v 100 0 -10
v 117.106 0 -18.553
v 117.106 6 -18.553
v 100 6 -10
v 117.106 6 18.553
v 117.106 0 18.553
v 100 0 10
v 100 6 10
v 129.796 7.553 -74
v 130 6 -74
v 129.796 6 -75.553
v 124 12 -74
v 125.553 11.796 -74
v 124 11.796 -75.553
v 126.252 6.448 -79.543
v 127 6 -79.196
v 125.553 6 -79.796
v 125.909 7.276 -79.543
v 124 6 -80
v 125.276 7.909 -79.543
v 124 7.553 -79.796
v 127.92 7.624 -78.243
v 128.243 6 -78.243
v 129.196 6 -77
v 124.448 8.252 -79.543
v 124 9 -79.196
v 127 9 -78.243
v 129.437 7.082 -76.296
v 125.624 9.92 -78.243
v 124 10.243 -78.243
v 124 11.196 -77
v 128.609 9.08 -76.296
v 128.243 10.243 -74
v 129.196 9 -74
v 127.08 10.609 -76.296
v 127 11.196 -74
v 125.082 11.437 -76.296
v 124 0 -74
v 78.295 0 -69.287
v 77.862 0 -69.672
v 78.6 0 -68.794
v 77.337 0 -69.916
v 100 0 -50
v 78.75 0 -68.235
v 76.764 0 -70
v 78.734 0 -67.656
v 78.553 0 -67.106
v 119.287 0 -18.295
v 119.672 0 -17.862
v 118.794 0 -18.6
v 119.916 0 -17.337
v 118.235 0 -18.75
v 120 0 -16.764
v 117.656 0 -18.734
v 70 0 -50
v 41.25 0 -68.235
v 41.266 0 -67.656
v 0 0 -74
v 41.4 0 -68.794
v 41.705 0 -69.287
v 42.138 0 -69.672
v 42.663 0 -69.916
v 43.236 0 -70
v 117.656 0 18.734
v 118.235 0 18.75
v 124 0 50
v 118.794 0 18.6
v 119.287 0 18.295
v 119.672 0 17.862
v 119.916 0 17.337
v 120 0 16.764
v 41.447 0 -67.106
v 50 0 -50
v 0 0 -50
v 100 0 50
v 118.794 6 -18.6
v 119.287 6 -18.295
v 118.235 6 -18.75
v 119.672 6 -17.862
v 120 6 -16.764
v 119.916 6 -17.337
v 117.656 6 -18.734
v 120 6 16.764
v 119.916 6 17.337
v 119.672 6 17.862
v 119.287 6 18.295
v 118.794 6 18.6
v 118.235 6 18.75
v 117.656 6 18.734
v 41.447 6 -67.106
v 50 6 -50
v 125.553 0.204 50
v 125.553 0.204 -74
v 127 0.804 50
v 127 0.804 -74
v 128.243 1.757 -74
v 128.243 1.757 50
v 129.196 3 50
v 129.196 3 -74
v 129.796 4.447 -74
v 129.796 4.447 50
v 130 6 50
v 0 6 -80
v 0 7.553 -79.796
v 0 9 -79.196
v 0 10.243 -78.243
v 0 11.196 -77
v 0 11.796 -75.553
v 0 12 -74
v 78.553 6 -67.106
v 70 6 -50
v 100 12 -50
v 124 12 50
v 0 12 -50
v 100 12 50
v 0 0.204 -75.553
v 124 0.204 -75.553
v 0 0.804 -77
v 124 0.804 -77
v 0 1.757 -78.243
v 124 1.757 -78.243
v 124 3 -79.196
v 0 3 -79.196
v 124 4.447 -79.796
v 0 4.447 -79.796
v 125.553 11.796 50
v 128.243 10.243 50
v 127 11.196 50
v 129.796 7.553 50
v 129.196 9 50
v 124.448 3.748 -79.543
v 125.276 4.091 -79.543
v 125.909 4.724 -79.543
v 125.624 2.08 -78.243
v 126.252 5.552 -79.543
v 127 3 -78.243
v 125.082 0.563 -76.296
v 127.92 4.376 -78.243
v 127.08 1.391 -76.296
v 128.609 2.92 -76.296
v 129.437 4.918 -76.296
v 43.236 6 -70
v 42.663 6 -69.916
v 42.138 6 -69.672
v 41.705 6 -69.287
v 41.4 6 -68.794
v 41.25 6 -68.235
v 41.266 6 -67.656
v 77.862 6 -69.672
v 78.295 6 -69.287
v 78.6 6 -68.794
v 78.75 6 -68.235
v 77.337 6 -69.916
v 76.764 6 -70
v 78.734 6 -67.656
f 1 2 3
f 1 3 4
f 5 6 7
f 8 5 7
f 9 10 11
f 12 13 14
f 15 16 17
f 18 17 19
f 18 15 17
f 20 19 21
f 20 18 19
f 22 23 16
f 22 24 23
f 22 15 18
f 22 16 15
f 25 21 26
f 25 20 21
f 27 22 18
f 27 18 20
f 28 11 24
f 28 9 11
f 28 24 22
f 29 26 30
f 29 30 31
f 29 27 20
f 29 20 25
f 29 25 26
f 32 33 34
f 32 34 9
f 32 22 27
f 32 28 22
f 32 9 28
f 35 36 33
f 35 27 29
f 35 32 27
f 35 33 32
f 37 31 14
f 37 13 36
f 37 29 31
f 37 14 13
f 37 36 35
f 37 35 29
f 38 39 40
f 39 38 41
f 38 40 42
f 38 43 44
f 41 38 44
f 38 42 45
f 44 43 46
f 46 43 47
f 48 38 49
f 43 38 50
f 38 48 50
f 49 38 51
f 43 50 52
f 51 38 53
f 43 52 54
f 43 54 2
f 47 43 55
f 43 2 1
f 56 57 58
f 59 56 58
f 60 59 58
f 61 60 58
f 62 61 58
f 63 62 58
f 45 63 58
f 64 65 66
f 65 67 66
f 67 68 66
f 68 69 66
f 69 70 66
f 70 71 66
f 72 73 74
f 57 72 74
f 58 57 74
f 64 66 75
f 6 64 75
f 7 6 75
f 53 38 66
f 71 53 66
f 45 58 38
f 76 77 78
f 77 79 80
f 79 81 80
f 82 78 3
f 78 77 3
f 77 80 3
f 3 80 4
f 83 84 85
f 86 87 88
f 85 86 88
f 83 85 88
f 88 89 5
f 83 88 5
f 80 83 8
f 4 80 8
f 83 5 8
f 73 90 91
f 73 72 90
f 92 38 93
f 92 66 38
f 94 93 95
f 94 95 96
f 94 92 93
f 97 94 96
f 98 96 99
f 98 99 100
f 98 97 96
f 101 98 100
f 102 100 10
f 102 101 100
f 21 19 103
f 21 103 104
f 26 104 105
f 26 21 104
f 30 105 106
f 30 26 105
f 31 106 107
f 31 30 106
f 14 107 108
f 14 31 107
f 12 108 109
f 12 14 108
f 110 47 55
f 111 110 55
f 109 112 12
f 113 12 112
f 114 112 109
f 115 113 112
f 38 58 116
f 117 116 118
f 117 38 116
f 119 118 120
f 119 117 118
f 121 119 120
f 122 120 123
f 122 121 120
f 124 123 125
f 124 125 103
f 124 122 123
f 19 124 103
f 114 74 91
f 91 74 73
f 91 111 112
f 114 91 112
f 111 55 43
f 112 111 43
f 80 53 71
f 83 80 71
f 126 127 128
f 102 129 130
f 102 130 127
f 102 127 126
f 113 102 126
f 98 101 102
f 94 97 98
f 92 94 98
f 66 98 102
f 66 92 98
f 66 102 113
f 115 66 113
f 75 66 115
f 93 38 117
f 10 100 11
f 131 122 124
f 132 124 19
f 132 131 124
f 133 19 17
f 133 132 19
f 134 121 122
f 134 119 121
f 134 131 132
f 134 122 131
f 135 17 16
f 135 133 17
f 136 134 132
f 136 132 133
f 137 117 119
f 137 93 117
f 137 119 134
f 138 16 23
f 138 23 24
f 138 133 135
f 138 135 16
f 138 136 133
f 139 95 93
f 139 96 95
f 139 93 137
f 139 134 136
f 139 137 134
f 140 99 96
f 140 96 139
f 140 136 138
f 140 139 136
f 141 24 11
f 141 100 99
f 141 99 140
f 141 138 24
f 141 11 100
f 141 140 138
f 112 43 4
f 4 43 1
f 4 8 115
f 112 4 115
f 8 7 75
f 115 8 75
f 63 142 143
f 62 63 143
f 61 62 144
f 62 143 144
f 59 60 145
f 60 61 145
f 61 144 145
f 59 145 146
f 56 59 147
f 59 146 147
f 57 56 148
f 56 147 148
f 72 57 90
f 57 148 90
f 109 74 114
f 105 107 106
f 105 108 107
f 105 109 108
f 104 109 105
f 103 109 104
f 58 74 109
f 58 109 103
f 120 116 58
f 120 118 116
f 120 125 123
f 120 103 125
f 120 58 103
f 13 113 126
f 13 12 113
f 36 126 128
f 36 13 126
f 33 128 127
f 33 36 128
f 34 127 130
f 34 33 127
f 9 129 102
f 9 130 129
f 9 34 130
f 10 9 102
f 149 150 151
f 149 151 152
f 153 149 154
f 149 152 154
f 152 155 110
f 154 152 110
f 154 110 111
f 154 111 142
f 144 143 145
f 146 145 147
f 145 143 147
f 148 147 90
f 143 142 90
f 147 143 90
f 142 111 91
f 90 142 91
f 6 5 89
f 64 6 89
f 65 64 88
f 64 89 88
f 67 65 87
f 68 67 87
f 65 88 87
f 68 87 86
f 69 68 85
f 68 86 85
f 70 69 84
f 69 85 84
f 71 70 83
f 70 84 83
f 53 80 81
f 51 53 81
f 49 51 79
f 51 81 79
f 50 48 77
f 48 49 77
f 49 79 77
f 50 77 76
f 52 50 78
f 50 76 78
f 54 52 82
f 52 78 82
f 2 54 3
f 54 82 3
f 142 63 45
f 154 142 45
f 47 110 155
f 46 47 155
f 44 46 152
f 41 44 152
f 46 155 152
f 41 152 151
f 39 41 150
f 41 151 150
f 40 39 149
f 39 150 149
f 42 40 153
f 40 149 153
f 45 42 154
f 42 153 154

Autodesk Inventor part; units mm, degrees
ref_plane "YZ Plane" through (0, 0, 0) normal (1, 0, 0) x (0, 1, 0)
ref_plane "XZ Plane" through (0, 0, 0) normal (0, 1, 0) x (-1, 0, 0)
ref_plane "XY Plane" through (0, 0, 0) normal (0, 0, 1) x (1, 0, 0)
sketch "Sketch1" plane through (0, 0, 0) normal (0, 1, 0) x (-1, 0, 0)
  line L0 (100, -50) -> (-100, -50)
  line L1 (-100, -50) -> (-100, 50)
  line L2 (-100, 50) -> (100, 50)
  line L3 (100, 50) -> (100, -50)
  line L4 (100, -50) -> (-100, 50) construction
  line L5 (-100, -50) -> (100, 50) construction
  line L6 (-40, -30) -> (-80, -30)
  line L7 (-50, -50) -> (-70, -50)
  line L8 (-40, -30) -> (-50, -50)
  line L9 (-80, -30) -> (-70, -50)
  line L10 (80, -30) -> (40, -30)
  line L11 (70, -50) -> (50, -50)
  line L12 (80, -30) -> (70, -50)
  line L13 (40, -30) -> (50, -50)
  line L14 (-100, -10) -> (-100, 10)
  line L15 (-80, -20) -> (-80, 20)
  line L16 (-80, -20) -> (-100, -10)
  line L17 (-80, 20) -> (-100, 10)
  line L18 (-100, -50) -> (-130, -50)
  line L19 (-130, -50) -> (-130, 50)
  line L20 (-130, 50) -> (-100, 50)
  line L21 (-100, 50) -> (-100, -50)
  line L22 (-130, -50) -> (0, -50)
  line L23 (0, -50) -> (0, -80)
  line L24 (0, -80) -> (-130, -80)
  line L25 (-130, -80) -> (-130, -50)
  line L26 (-40, -70) -> (-80, -70)
  line L27 (-40, -70) -> (-50, -50)
  line L28 (-80, -70) -> (-70, -50)
  line L29 (-120, -20) -> (-120, 20)
  line L30 (-120, -20) -> (-100, -10)
  line L31 (-120, 20) -> (-100, 10)
  point P0 (0, 0)
  point P1 (-100, 10)
  point P2 (-100, -10)
  point P3 (-70, -50)
  point P4 (-50, -50)
  point P5 (70, -50)
  point P6 (0, 0)
  point P7 (0, 0)
  point P8 (0, -50)
  dimension "d72" = 200
  dimension "d73" = 100
  dimension "d78" = 20
  dimension "d79" = 40
  dimension "d80" = 20
  dimension "d81" = 10
  dimension "d82" = 20
  dimension "d83" = 40
  dimension "d84" = 20
  dimension "d85" = 10
  dimension "d86" = 120
  dimension "d87" = 30
  dimension "d88" = 0
  dimension "d89" = 0
  dimension "d90" = 40
  dimension "d91" = 20
  dimension "d92" = 20
  dimension "d93" = 10
  dimension "d94" = 40
  dimension "d95" = 0
  dimension "d114" = 30
  dimension "d115" = 130
  dimension "d116" = 30
extrude "Extrusion24" add sketch "Sketch1" along normal blind 12 contours L1 L31 L29 L30 L18 L19 L20 | L23 L24 L25 L18 L0 L28 L26 L27 | L1 L30 L29 L31 | L27 L26 L28 L0
extrude "Extrusion25" cut sketch "Sketch1" along normal blind 6 contours L1 L30 L29 L31 | L27 L26 L28 L0
fillet "Fillet12" radius 2 4 edges at (120, 3, 20) (120, 3, -20) (80, 3, -70) (40, 3, -70)
fillet "Fillet13" radius 6 5 edges at (130, 0, -15) (130, 12, -15) (65, 12, -80) (65, 0, -80) (130, 6, -80)
properties part number "Test2_3DPrint"
